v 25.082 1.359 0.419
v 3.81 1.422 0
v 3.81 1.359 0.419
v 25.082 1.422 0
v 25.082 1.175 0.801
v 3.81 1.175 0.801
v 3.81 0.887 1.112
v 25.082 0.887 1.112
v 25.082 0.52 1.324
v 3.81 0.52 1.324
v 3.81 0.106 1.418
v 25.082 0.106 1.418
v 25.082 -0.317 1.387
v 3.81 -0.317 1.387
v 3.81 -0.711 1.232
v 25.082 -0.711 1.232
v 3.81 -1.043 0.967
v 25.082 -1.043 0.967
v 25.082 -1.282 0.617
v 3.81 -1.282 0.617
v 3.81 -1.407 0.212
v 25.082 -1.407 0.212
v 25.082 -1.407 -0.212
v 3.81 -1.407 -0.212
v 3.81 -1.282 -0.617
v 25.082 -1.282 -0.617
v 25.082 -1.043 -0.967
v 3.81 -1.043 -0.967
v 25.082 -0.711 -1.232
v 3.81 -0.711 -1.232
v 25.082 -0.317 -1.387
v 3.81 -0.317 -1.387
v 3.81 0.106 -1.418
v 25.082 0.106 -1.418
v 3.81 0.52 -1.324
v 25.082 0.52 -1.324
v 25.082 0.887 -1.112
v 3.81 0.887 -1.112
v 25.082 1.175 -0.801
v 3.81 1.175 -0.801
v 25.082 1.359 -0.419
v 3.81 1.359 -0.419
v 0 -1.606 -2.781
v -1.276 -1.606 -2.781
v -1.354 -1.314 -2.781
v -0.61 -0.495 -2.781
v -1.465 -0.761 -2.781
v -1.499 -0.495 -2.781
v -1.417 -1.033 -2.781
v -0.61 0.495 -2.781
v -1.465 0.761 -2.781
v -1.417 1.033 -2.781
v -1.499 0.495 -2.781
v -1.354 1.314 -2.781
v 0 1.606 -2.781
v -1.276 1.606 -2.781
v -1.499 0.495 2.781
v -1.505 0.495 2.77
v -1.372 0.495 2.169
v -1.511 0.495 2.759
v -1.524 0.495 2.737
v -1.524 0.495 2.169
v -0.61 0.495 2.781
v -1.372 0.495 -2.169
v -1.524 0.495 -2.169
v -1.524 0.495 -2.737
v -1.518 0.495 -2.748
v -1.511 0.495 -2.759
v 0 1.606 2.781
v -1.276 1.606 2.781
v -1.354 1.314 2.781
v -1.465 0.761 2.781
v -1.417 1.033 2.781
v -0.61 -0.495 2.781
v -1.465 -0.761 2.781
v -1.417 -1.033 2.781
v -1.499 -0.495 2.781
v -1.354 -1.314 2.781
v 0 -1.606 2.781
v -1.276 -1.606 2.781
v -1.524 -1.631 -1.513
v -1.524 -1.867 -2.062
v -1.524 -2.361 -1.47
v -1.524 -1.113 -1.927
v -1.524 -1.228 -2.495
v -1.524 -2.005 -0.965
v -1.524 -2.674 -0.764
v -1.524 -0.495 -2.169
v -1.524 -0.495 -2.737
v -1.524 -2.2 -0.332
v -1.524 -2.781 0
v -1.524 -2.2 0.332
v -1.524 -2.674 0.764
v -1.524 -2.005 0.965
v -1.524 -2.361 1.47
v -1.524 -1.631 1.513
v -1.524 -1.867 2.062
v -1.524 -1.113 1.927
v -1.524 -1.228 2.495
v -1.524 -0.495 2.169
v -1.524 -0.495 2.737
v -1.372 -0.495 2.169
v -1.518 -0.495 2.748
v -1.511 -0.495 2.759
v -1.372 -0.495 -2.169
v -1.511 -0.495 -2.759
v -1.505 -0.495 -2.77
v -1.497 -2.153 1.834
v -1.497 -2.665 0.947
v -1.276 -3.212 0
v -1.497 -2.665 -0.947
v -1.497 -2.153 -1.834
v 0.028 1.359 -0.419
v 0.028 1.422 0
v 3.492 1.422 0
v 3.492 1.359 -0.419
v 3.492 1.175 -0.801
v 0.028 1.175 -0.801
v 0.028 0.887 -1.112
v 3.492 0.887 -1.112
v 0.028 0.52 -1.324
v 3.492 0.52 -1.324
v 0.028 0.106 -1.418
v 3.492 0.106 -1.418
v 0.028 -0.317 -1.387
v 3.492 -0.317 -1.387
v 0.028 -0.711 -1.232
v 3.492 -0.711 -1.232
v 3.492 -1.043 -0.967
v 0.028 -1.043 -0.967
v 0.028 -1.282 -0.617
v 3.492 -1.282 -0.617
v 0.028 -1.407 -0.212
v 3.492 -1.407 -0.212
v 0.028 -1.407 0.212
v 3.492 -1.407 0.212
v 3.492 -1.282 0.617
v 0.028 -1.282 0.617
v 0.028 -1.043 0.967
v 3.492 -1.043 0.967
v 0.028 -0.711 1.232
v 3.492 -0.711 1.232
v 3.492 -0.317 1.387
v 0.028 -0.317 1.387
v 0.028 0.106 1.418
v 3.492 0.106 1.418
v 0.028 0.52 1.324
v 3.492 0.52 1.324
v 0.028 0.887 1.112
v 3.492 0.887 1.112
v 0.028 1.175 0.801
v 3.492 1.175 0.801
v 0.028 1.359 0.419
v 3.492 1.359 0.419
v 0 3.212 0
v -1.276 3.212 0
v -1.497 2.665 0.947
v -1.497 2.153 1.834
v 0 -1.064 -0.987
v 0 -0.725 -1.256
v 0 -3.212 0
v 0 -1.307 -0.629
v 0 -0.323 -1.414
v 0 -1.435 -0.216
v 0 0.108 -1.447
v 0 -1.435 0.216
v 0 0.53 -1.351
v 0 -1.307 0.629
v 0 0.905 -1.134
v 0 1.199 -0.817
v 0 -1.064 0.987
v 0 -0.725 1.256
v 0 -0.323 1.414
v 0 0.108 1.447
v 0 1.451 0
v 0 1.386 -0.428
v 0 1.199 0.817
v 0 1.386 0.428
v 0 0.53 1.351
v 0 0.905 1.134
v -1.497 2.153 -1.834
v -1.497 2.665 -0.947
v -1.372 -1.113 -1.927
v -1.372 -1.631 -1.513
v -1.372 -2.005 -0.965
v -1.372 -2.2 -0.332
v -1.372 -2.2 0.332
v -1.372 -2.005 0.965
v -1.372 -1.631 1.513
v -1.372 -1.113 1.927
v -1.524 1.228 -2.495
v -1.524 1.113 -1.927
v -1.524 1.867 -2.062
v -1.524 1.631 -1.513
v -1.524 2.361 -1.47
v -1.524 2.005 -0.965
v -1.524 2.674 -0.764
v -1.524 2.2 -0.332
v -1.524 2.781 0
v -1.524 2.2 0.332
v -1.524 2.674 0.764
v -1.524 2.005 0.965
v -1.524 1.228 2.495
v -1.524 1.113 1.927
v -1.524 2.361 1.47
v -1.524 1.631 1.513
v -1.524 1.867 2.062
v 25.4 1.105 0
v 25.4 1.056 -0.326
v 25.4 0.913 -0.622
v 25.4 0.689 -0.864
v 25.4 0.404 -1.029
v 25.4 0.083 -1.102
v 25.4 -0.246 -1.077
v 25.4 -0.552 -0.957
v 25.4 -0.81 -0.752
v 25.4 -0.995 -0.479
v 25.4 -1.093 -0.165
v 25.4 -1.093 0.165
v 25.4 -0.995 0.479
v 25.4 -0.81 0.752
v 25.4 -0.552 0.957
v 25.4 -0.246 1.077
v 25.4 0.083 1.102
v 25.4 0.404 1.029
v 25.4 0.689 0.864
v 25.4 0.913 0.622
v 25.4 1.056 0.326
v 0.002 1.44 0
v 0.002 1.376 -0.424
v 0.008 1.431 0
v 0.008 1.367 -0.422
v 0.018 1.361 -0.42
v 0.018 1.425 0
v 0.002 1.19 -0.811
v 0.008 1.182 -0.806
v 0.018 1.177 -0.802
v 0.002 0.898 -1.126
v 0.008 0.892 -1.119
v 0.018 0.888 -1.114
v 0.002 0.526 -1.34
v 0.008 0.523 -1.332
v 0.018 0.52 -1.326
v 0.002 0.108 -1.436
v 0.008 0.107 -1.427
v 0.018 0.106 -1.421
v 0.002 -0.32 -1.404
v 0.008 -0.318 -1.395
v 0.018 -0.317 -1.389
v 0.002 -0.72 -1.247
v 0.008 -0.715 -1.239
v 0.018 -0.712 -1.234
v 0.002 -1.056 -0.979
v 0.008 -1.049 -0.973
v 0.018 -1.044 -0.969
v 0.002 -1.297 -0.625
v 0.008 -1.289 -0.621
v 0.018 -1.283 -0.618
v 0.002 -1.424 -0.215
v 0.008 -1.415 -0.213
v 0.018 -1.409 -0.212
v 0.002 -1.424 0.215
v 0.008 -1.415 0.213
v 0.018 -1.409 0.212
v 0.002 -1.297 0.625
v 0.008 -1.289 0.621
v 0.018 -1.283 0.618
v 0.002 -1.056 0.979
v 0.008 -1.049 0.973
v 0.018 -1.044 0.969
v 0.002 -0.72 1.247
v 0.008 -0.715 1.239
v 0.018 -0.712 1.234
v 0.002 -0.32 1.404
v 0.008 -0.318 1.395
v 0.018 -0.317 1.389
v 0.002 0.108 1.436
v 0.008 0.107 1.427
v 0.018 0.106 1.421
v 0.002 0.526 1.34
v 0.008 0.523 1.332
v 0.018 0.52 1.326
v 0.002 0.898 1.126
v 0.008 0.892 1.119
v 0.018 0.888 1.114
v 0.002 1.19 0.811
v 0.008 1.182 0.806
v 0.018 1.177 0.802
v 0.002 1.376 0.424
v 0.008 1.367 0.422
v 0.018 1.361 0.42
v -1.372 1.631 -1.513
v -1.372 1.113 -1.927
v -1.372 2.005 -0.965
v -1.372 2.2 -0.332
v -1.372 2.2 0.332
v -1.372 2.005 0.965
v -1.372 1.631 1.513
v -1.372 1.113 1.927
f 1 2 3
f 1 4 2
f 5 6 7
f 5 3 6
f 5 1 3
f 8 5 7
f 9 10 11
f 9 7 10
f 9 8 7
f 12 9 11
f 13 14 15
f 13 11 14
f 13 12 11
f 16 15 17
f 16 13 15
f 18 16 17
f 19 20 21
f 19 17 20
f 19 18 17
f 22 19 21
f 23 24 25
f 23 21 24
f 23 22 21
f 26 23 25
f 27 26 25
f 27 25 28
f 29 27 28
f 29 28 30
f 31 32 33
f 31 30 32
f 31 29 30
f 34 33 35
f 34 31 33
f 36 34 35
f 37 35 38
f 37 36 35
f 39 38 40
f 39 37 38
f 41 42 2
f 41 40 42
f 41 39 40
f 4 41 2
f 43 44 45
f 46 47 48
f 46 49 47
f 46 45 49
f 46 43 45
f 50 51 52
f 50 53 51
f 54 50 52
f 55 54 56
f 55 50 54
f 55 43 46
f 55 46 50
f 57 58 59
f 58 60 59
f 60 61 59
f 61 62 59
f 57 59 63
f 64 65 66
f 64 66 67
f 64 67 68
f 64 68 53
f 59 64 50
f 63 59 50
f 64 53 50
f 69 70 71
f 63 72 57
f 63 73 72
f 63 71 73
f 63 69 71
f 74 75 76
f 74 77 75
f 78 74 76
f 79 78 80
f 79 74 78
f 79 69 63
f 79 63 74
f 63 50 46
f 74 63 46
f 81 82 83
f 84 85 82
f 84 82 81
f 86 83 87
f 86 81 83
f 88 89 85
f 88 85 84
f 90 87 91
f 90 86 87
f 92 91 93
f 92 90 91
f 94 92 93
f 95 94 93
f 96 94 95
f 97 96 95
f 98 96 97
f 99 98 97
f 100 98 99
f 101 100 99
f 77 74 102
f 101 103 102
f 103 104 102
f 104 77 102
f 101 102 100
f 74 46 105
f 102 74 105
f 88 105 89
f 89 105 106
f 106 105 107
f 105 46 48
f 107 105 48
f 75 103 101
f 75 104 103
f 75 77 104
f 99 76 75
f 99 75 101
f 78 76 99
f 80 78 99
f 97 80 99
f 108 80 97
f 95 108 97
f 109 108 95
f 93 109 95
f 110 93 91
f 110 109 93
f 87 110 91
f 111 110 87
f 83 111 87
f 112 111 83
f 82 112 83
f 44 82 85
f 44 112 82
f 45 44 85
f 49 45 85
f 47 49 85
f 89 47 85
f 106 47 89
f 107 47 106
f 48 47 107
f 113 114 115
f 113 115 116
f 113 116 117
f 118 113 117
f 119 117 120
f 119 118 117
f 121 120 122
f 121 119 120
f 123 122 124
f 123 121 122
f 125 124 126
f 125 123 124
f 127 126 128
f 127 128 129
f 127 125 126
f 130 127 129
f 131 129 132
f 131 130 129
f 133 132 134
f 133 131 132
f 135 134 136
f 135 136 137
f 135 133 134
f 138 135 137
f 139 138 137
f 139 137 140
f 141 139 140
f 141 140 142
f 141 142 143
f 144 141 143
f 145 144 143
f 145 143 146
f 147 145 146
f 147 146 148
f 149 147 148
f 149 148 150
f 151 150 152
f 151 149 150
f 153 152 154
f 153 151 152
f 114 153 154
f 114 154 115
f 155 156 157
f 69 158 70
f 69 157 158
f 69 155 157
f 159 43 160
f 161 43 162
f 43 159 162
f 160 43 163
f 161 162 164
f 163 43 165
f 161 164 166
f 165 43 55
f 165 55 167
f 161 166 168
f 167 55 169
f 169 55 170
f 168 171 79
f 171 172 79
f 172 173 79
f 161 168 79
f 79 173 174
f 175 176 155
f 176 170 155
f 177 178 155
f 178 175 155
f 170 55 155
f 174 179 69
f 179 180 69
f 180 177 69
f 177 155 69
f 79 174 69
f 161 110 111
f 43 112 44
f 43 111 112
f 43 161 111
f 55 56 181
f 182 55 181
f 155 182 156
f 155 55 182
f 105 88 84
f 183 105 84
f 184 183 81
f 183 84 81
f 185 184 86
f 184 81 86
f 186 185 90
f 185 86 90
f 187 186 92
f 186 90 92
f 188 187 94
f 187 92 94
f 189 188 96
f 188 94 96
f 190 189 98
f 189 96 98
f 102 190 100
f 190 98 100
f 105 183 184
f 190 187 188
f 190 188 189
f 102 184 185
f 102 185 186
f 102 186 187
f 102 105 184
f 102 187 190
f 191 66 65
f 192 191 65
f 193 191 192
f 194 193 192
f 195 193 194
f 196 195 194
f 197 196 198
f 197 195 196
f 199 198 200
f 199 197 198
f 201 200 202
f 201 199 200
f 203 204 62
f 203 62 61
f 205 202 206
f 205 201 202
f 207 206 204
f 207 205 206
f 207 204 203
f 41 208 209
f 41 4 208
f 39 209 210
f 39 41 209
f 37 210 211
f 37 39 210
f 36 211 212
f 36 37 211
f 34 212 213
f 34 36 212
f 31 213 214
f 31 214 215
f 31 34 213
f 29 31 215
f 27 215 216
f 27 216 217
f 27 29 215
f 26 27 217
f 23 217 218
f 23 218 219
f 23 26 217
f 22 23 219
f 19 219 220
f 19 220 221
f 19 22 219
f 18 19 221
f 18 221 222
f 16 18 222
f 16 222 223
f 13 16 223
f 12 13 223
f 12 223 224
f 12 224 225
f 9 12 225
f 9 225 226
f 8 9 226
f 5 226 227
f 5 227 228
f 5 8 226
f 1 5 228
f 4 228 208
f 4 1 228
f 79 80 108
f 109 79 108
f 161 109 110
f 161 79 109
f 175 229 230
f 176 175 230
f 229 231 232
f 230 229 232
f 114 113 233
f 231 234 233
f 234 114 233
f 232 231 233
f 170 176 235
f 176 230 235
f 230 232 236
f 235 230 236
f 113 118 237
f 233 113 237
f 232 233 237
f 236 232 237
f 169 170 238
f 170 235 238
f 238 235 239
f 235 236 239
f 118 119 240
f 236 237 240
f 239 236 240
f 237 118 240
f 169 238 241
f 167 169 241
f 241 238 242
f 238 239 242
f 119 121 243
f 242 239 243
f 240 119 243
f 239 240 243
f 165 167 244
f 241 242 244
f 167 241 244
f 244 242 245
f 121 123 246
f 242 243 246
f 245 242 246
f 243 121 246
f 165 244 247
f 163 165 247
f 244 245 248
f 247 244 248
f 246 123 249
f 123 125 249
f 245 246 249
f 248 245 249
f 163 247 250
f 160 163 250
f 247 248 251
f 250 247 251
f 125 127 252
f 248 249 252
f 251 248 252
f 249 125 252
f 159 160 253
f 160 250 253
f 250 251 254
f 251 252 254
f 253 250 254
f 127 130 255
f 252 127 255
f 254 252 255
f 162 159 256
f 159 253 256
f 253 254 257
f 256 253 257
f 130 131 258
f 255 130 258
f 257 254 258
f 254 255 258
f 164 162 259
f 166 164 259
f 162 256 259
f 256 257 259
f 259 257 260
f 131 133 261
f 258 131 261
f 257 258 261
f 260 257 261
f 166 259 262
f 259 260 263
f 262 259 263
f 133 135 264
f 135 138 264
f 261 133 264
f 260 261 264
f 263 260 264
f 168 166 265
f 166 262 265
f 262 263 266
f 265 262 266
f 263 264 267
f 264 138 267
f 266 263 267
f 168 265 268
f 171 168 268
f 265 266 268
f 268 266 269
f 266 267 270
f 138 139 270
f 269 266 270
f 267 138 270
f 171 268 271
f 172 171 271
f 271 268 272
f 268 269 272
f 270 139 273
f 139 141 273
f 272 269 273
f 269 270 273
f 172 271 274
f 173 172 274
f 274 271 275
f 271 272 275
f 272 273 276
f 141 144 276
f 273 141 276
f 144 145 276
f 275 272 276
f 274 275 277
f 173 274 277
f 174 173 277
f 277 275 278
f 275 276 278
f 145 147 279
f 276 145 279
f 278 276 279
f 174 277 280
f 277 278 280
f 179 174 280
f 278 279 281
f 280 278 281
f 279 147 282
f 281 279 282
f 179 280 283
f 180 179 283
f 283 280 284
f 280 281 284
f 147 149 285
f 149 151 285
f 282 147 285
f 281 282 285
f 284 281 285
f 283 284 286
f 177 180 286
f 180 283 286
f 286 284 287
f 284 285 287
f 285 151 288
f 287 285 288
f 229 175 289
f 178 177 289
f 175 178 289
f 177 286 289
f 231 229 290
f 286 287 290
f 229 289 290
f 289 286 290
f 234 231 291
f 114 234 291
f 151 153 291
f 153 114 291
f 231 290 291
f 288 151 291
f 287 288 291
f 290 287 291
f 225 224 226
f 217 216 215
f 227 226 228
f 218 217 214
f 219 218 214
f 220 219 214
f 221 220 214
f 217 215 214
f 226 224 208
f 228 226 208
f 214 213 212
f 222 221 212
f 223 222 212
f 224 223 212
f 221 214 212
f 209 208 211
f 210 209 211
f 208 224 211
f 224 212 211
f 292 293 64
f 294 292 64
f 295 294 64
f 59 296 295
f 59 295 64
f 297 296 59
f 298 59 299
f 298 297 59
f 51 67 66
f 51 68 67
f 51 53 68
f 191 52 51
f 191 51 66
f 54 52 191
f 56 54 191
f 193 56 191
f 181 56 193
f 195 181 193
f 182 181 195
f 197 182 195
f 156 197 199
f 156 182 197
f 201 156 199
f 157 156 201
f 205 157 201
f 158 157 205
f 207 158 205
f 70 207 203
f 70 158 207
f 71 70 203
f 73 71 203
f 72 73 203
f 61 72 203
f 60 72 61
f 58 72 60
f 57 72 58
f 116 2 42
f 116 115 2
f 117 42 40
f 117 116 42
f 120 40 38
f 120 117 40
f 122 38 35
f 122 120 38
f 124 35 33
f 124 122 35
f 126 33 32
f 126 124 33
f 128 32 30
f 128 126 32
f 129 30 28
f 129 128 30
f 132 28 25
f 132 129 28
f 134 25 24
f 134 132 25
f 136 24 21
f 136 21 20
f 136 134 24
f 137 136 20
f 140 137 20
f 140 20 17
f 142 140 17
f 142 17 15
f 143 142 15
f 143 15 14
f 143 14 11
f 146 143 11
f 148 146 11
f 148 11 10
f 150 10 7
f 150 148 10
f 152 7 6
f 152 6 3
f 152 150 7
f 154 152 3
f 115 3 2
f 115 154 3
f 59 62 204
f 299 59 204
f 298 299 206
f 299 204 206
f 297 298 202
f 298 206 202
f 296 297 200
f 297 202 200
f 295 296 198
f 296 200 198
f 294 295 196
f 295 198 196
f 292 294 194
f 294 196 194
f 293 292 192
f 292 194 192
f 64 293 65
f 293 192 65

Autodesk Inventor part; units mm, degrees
ref_plane "YZ Plane" through (0, 0, 0) normal (1, 0, 0) x (0, 1, 0)
ref_plane "XZ Plane" through (0, 0, 0) normal (0, 1, 0) x (-1, 0, 0)
sketch "Sketch1" plane through (0, 0, 0) normal (0, 0, 1) x (1, 0, 0)
  line L0 (0, 1.4224) -> (0, 0)
  line L1 (3.81, 1.4224) -> (25.4, 1.4224)
  line L2 (25.4, 1.4224) -> (25.4, 0)
  line L3 (25.4, 0) -> (0, 0)
  line L4 (3.81, 1.4224) -> (3.4925, 1.4224)
  line L5 (3.4925, 1.4224) -> (0, 1.4224)
  line L6 (-5.08, 0) -> (30.48, 0) projected
  line L7 (0, -0.2845) -> (0, 1.7069) projected
  dimension "d0" = 25.4
  dimension "d1" = 21.59
  dimension "d2" = 2.8448
  dimension "d13" = 0.3175
  dimension "d24" = 2.8448
revolve "Body" add sketch "Sketch1" angle 360 about axis through (25.4, 0, 0) along (-1, 0, 0)
sketch "Sketch2" plane through (0, 0, 0) normal (-1, 0, 0) x (0, 0, 1)
  line L0 (0, 3.2116) -> (2.7813, 1.6058)
  line L1 (2.7813, 1.6058) -> (2.7813, -1.6058)
  line L2 (2.7813, -1.6058) -> (0, -3.2116)
  line L3 (0, -3.2116) -> (-2.7813, -1.6058)
  line L4 (-2.7813, -1.6058) -> (-2.7813, 1.6058)
  line L5 (-2.7813, 1.6058) -> (0, 3.2116)
  circle A0 centre (0, 0) radius 1.4224 projected
  dimension "d8" = 5.5626
extrude "Head" add sketch "Sketch2" along normal blind 1.524 contours L0 L1 L2 L3 L4 L5 | A0
sketch "Sketch3" plane through (-1.524, 0, 0) normal (-1, 0, 0) x (0, 0, 1)
  circle A0 centre (0, 0) radius 2.225
  point P0 (0, 0)
  dimension "d17" = 4.4501
extrude "Indent" cut sketch "Sketch3" against normal blind 0.1524
sketch "Sketch4" plane through (0, 0, 0) normal (0, 0, 1) x (1, 0, 0)
  line L0 (-1.524, 0.4953) -> (-0.6095, 0.4953)
  line L1 (-0.6095, 0.4953) -> (-0.6095, -0.4953)
  line L2 (-0.6095, -0.4953) -> (-1.524, -0.4953)
  line L3 (-1.524, -0.4953) -> (-1.524, 0.4953)
  line L4 (-0.6095, 0) -> (-1.524, 0) construction
  line L5 (-1.7069, 0) -> (-0.4266, 0) projected
  line L6 (-1.524, 1.6058) -> (-1.524, -1.6058) projected
  dimension "d9" = 0.9906
  dimension "d10" = 0.9145
extrude "Slot" cut sketch "Sketch4" along normal through all both and the other way through all
sketch "Sketch5" plane through (0, 0, 0) normal (0, 0, 1) x (1, 0, 0)
  line L0 (-1.8288, 0) -> (0.3048, 0) projected
  line L1 (-1.524, 3.2116) -> (-1.524, 2.7813)
  line L2 (-1.524, 2.7813) -> (-1.2756, 3.2116)
  line L3 (-1.2756, 3.2116) -> (-1.524, 3.2116)
  line L4 (0, 3.2116) -> (-1.524, 3.2116) projected
  line L5 (-1.524, 3.2116) -> (-1.524, 1.6058) projected
  dimension "d22" = 30
  dimension "d23" = 5.5626
revolve "Chamfer1" cut sketch "Sketch5" angle 360 about axis through (-10, 0, 0) along (1, 0, 0)
fillet "Fillet1" radius 0.0284 1 edges at (0, -1.4224, 0)
thread "Thread" size "4-40 UNC" class "2A" standard "ANSI Unified Screw Threads" length 21.59
chamfer "Chamfer2" distance 0.3175 distance2 0.3175 1 edges at (25.4, -1.4224, 0) measured on face at (25.4, -0.5703, -0.3902)
ref_plane "Work Plane1" through (14.605, 0, 0) normal (0, 0, -1) x (1, 0, 0)
equation "\"d0\" = NLG"
equation "\"d1\" = GEL"
equation "\"d2\" = GD"
equation "\"d13\" = GAL"
equation "\"d24\" = BDM"
equation "\"d8\" = SW"
equation "\"d3\" = KOH - SD"
equation "\"d17\" = KOD2"
equation "\"d18\" = KOH2"
equation "\"d9\" = SBR"
equation "\"d22\" = ANG1"
equation "\"d23\" = SW"
equation "\"d16\" = RR"
equation "\"d14\" = GEL"
equation "\"d5\" = -0.5 * SPD + 0.5 * GD"
equation "\"d6\" = GUL"
equation "\"NLG\" = 25.4"
equation "\"GD\" = NND"
equation "\"BDM\" = NND"
equation "\"KOH\" = 1.524"
equation "\"GEL\" = 21.59"
equation "\"SW\" = 5.5626"
equation "\"SPD\" = GD1"
equation "\"SD\" = 0"
equation "\"ANG1\" = 30deg"
equation "\"GAL\" = 0.3175"
equation "\"GUL\" = GAL"
equation "\"STI\" = 0.9144"
equation "\"SBR\" = 0.9906"
equation "\"RR\" = 0.02845"
equation "\"KOD2\" = 0.8 * SW"
equation "\"KOH2\" = 0.1 * KOH"
equation "\"SW0\" = SW"
equation "\"THREADDIA\" = 2.8448"
equation "\"SDH\" = SW"
equation "\"E0\" = 1.155 * SW"
equation "\"TOA\" = 30deg"
equation "\"NND\" = 2.8448"
equation "\"GD1\" = 2.2098"
equation "\"SD2\" = NND"
properties part number "ANSI B18.6.3 - 4-40 UNC - 1, SILHHMSI" material "Steel, Mild"
